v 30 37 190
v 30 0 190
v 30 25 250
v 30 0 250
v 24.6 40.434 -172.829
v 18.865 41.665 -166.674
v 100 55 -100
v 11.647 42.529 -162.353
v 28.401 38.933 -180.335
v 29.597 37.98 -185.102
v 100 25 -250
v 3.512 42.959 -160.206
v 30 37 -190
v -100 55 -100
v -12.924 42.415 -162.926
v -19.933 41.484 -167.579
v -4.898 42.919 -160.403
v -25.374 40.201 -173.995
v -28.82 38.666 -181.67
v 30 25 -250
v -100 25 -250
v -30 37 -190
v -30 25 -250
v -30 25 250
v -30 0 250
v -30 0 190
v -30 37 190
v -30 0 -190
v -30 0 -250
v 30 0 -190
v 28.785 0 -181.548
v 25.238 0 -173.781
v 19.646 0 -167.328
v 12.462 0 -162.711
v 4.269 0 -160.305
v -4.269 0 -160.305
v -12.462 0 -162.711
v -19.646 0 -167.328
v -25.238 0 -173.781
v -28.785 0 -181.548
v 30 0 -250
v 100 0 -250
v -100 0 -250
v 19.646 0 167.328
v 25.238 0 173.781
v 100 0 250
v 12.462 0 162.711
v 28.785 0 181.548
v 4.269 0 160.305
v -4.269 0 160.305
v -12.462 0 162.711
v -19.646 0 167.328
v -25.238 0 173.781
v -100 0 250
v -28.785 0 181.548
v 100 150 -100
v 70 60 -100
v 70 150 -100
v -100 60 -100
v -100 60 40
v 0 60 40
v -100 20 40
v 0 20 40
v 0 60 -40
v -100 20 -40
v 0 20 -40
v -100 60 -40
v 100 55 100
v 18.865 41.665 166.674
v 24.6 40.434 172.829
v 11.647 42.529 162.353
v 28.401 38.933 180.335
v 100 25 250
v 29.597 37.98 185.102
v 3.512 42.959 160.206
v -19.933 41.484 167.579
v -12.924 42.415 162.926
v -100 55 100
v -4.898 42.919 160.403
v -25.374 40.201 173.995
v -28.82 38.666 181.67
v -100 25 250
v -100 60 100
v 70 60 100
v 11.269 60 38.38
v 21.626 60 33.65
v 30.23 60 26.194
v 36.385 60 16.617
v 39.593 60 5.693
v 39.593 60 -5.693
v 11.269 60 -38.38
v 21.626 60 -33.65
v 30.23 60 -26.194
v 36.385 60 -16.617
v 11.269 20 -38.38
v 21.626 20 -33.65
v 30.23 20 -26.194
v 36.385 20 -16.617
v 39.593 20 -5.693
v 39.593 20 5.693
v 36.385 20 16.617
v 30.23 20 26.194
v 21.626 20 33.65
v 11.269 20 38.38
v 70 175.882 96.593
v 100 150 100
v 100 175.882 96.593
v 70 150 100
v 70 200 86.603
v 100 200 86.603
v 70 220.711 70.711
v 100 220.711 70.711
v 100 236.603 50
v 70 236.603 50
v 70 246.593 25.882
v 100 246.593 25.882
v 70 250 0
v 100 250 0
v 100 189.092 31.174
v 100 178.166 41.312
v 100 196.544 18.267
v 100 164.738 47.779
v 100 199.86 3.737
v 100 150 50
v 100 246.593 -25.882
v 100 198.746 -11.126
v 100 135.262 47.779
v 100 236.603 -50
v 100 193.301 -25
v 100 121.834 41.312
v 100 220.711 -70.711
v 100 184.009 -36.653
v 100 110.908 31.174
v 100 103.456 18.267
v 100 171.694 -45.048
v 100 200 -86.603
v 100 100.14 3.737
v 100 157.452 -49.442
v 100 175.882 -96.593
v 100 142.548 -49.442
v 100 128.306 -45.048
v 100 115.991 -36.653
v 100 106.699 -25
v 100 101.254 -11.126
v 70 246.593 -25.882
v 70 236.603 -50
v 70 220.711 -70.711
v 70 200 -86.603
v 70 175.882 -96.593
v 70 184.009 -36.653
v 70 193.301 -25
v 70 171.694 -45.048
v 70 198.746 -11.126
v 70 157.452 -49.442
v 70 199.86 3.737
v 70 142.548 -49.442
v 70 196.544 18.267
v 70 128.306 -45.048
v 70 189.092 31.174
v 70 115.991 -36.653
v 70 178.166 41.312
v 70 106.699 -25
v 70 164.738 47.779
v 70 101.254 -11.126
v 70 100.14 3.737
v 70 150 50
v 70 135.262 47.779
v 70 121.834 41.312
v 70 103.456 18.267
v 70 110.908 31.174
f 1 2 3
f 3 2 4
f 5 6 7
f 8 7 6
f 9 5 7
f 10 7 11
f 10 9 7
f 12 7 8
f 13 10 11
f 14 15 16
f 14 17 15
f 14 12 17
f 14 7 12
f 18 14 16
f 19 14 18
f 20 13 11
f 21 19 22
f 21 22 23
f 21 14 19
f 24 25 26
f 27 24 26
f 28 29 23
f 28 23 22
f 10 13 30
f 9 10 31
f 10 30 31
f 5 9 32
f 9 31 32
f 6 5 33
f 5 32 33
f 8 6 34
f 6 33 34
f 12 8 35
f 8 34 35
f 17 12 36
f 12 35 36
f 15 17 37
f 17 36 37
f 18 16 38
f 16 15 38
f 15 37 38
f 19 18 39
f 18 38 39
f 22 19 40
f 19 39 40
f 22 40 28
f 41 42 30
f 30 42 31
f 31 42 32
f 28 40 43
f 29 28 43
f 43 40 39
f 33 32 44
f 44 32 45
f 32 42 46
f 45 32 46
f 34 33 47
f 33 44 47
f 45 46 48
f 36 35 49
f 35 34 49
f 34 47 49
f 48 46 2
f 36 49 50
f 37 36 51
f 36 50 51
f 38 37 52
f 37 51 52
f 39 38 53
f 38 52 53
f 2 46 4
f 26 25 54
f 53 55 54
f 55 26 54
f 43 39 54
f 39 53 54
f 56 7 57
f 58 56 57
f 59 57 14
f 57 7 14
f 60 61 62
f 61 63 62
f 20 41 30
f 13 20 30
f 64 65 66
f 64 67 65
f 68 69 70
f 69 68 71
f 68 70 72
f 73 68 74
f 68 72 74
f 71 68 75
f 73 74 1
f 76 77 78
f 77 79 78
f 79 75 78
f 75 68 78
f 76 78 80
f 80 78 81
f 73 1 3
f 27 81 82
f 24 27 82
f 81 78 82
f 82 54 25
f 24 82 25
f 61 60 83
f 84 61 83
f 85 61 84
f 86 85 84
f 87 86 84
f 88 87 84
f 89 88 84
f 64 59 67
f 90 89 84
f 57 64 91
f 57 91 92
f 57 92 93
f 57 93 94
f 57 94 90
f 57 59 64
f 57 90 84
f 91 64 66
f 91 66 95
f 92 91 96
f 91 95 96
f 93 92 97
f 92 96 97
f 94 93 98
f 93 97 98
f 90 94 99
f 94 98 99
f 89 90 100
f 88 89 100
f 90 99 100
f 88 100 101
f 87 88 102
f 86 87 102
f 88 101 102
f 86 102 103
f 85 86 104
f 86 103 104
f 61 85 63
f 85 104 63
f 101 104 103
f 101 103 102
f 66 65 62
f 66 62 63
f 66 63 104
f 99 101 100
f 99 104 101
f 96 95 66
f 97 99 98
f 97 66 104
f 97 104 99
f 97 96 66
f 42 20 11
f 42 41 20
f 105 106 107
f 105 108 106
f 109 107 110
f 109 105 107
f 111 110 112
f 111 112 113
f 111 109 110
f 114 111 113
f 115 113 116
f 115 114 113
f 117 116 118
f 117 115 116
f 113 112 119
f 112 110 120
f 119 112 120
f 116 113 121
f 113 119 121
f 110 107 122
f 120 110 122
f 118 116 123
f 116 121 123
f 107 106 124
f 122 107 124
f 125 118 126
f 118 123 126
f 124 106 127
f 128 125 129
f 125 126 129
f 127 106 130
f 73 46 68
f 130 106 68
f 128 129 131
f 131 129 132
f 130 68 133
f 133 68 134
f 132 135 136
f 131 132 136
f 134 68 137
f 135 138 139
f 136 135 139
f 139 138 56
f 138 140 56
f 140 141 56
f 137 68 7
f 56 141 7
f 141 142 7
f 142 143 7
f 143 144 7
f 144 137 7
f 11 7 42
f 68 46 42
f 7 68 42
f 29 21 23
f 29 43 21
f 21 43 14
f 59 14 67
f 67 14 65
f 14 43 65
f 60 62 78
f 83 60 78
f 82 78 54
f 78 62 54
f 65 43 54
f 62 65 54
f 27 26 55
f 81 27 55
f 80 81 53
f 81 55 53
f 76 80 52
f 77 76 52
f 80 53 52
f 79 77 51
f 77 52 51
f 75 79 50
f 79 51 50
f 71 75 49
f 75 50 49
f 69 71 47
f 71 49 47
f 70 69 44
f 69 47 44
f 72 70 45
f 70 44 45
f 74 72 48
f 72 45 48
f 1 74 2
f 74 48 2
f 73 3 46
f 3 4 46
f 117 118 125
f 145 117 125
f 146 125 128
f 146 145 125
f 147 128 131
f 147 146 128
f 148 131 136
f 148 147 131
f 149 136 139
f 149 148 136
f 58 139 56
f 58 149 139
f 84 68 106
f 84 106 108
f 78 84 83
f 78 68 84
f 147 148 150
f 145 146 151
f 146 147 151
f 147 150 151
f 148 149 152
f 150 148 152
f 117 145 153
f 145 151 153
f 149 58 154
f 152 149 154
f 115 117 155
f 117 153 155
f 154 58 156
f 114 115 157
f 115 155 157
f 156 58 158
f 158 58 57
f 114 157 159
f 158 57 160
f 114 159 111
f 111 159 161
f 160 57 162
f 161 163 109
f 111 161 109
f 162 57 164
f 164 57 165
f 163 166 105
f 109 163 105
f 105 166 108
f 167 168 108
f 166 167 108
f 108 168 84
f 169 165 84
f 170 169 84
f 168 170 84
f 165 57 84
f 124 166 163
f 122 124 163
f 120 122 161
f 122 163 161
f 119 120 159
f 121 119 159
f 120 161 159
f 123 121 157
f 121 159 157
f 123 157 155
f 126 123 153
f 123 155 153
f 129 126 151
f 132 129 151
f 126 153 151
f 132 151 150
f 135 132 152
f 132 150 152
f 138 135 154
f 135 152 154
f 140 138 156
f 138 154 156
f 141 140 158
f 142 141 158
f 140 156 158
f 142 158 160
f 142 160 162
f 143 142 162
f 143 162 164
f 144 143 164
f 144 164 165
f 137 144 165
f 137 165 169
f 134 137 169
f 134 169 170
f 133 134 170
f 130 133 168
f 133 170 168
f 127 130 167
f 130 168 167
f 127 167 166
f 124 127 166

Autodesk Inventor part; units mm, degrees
ref_plane "YZ Plane" through (0, 0, 0) normal (1, 0, 0) x (0, 1, 0)
ref_plane "XZ Plane" through (0, 0, 0) normal (0, 1, 0) x (-1, 0, 0)
ref_plane "XY Plane" through (0, 0, 0) normal (0, 0, 1) x (1, 0, 0)
sketch "Boceto1" plane through (0, 0, 0) normal (0, 1, 0) x (-1, 0, 0)
  line L0 (0, 0) -> (100, 0)
  line L1 (100, 0) -> (100, 250)
  line L2 (100, 250) -> (30, 250)
  line L3 (0, 0) -> (0, 190)
  circle A0 centre (0, 190) radius 30
  line L4 (30, 250) -> (30, 190)
  line L5 (0, 40) -> (100, 40)
  line L6 (-30, 190) -> (-30, 250)
  line L7 (-30, 250) -> (-100, 250)
  line L8 (-100, 250) -> (-100, 0)
  line L9 (-108.7956, 0) -> (-108.7956, 100)
  line L10 (-108.7956, 100) -> (100, 100)
  line L11 (100, 0) -> (100, -250)
  line L12 (100, -250) -> (30, -250)
  circle A1 centre (0, -190) radius 30
  line L13 (30, -250) -> (30, -190)
  line L14 (-30, -190) -> (-30, -250)
  line L15 (-30, -250) -> (-100, -250)
  line L16 (-100, -250) -> (-100, 0)
  point P0 (0, -40)
  point P1 (100, -40)
  point P2 (100, -100)
  dimension "d0" = 100
  dimension "d1" = 250
  dimension "d2" = 70
  dimension "d3" = 190
  dimension "d4" = 60
  dimension "d6" = 70
  dimension "d7" = 100
extrude "Extrusión1" add sketch "Boceto1" along normal blind 25 contours L3 L5 L1 L0 | L0 L11 L12 L13 A1 L14 L15 L16 L8 L10 L3 | L3 L10 L1 L5 | L10 L8 L7 L6 A0 L3 | L3 A0 L4 L2 L1 L10
sketch "Boceto2" plane through (0, 25, 0) normal (0, 1, 0) x (1, 0, 0)
  circle A0 centre (0, 0) radius 40
  line L0 (100, -250) -> (100, 250) projected
  line L1 (100, 0) -> (100, -100)
  line L2 (100, -100) -> (-100, -100)
  line L3 (-100, 250) -> (-100, -250) projected
  line L4 (-40, 0) -> (40, 0)
  line L5 (100, 100) -> (-100, 100)
  line L6 (0, -40) -> (-100, -40)
  line L7 (0, 40) -> (-100, 40)
  dimension "d10" = 80
  dimension "d11" = 100
extrude "Extrusión2" add sketch "Boceto2" along normal blind 35 contours A0 L7 L3 L5 L0 L2 L6
sketch "Boceto3" plane through (0, 25, 0) normal (0, 1, 0) x (1, 0, 0)
  line L0 (-100, 40) -> (0, 40) projected
  circle A0 centre (0, 0) radius 40
  line L1 (0, 40) -> (-100, 40)
  line L2 (0, -40) -> (-100, -40)
  line L3 (-100, 40) -> (-100, -40) projected
  line L4 (-100, 40) -> (-100, -40)
extrude "Extrusión3" cut sketch "Boceto3" against normal blind 5
sketch "Boceto4" plane through (0, 60, 0) normal (0, 1, 0) x (1, 0, 0)
  line L0 (100, 100) -> (-100, 100) projected
  line L1 (100, -100) -> (-100, -100) projected
  line L2 (100, 100) -> (70, 100)
  line L3 (70, 100) -> (70, -100)
  line L4 (70, -100) -> (100, -100)
  line L5 (100, -100) -> (100, 100)
  point P0 (0, 0)
  dimension "d16" = 30
extrude "Extrusión4" add sketch "Boceto4" along normal blind 190
sketch "Boceto5" plane through (70, 60, -100) normal (-1, 0, 0) x (0, 0, 1)
  line L0 (200, 0) -> (0, 0) projected
  line L1 (100, 0) -> (100, 90)
  circle A0 centre (100, 90) radius 50
  point P0 (100, -60)
  dimension "d19" = 90
  dimension "d20" = 100
extrude "Extrusión5" cut sketch "Boceto5" against normal blind 190
fillet "Empalme1" radius 100 2 edges at (85, 250, -100) (85, 250, 100)
sketch "Boceto6" plane through (-100, 0, -250) normal (-1, 0, 0) x (0, 0, 1)
  line L0 (150, 25) -> (150, 60) projected
  line L1 (150, 60) -> (150, 55)
  line L2 (150, 25) -> (0, 25) projected
  line L3 (150, 55) -> (0, 25)
  line L4 (250, 88.3729) -> (250, -17.9249)
  line L5 (350, 25) -> (350, 60)
  line L6 (350, 25) -> (500, 25)
  line L7 (350, 55) -> (500, 25)
  point P0 (250, 0)
  dimension "d24" = 5
extrude "Extrusión6" add sketch "Boceto6" against normal blind 200
sketch "Boceto7" plane through (0, 25, -190) normal (0, -1, 0) x (1, 0, 0)
  line L0 (30, -60) -> (30, 0) projected
  circle A0 centre (0, 0) radius 30
  line L1 (30, 0) -> (30, -60)
  line L2 (-30, -60) -> (30, -60) projected
  line L3 (-30, -60) -> (-100, -60) projected
  line L4 (30, -60) -> (-30, -60)
  line L5 (-30, -60) -> (-30, 0)
  line L6 (105.1195, 190) -> (-118.3663, 190)
  line L7 (30, 440) -> (30, 380)
  circle A1 centre (0, 380) radius 30
  line L8 (-30, 440) -> (30, 440)
  line L9 (-30, 440) -> (-30, 380)
  point P0 (0, 190)
extrude "Extrusión7" cut sketch "Boceto7" against normal blind 200
